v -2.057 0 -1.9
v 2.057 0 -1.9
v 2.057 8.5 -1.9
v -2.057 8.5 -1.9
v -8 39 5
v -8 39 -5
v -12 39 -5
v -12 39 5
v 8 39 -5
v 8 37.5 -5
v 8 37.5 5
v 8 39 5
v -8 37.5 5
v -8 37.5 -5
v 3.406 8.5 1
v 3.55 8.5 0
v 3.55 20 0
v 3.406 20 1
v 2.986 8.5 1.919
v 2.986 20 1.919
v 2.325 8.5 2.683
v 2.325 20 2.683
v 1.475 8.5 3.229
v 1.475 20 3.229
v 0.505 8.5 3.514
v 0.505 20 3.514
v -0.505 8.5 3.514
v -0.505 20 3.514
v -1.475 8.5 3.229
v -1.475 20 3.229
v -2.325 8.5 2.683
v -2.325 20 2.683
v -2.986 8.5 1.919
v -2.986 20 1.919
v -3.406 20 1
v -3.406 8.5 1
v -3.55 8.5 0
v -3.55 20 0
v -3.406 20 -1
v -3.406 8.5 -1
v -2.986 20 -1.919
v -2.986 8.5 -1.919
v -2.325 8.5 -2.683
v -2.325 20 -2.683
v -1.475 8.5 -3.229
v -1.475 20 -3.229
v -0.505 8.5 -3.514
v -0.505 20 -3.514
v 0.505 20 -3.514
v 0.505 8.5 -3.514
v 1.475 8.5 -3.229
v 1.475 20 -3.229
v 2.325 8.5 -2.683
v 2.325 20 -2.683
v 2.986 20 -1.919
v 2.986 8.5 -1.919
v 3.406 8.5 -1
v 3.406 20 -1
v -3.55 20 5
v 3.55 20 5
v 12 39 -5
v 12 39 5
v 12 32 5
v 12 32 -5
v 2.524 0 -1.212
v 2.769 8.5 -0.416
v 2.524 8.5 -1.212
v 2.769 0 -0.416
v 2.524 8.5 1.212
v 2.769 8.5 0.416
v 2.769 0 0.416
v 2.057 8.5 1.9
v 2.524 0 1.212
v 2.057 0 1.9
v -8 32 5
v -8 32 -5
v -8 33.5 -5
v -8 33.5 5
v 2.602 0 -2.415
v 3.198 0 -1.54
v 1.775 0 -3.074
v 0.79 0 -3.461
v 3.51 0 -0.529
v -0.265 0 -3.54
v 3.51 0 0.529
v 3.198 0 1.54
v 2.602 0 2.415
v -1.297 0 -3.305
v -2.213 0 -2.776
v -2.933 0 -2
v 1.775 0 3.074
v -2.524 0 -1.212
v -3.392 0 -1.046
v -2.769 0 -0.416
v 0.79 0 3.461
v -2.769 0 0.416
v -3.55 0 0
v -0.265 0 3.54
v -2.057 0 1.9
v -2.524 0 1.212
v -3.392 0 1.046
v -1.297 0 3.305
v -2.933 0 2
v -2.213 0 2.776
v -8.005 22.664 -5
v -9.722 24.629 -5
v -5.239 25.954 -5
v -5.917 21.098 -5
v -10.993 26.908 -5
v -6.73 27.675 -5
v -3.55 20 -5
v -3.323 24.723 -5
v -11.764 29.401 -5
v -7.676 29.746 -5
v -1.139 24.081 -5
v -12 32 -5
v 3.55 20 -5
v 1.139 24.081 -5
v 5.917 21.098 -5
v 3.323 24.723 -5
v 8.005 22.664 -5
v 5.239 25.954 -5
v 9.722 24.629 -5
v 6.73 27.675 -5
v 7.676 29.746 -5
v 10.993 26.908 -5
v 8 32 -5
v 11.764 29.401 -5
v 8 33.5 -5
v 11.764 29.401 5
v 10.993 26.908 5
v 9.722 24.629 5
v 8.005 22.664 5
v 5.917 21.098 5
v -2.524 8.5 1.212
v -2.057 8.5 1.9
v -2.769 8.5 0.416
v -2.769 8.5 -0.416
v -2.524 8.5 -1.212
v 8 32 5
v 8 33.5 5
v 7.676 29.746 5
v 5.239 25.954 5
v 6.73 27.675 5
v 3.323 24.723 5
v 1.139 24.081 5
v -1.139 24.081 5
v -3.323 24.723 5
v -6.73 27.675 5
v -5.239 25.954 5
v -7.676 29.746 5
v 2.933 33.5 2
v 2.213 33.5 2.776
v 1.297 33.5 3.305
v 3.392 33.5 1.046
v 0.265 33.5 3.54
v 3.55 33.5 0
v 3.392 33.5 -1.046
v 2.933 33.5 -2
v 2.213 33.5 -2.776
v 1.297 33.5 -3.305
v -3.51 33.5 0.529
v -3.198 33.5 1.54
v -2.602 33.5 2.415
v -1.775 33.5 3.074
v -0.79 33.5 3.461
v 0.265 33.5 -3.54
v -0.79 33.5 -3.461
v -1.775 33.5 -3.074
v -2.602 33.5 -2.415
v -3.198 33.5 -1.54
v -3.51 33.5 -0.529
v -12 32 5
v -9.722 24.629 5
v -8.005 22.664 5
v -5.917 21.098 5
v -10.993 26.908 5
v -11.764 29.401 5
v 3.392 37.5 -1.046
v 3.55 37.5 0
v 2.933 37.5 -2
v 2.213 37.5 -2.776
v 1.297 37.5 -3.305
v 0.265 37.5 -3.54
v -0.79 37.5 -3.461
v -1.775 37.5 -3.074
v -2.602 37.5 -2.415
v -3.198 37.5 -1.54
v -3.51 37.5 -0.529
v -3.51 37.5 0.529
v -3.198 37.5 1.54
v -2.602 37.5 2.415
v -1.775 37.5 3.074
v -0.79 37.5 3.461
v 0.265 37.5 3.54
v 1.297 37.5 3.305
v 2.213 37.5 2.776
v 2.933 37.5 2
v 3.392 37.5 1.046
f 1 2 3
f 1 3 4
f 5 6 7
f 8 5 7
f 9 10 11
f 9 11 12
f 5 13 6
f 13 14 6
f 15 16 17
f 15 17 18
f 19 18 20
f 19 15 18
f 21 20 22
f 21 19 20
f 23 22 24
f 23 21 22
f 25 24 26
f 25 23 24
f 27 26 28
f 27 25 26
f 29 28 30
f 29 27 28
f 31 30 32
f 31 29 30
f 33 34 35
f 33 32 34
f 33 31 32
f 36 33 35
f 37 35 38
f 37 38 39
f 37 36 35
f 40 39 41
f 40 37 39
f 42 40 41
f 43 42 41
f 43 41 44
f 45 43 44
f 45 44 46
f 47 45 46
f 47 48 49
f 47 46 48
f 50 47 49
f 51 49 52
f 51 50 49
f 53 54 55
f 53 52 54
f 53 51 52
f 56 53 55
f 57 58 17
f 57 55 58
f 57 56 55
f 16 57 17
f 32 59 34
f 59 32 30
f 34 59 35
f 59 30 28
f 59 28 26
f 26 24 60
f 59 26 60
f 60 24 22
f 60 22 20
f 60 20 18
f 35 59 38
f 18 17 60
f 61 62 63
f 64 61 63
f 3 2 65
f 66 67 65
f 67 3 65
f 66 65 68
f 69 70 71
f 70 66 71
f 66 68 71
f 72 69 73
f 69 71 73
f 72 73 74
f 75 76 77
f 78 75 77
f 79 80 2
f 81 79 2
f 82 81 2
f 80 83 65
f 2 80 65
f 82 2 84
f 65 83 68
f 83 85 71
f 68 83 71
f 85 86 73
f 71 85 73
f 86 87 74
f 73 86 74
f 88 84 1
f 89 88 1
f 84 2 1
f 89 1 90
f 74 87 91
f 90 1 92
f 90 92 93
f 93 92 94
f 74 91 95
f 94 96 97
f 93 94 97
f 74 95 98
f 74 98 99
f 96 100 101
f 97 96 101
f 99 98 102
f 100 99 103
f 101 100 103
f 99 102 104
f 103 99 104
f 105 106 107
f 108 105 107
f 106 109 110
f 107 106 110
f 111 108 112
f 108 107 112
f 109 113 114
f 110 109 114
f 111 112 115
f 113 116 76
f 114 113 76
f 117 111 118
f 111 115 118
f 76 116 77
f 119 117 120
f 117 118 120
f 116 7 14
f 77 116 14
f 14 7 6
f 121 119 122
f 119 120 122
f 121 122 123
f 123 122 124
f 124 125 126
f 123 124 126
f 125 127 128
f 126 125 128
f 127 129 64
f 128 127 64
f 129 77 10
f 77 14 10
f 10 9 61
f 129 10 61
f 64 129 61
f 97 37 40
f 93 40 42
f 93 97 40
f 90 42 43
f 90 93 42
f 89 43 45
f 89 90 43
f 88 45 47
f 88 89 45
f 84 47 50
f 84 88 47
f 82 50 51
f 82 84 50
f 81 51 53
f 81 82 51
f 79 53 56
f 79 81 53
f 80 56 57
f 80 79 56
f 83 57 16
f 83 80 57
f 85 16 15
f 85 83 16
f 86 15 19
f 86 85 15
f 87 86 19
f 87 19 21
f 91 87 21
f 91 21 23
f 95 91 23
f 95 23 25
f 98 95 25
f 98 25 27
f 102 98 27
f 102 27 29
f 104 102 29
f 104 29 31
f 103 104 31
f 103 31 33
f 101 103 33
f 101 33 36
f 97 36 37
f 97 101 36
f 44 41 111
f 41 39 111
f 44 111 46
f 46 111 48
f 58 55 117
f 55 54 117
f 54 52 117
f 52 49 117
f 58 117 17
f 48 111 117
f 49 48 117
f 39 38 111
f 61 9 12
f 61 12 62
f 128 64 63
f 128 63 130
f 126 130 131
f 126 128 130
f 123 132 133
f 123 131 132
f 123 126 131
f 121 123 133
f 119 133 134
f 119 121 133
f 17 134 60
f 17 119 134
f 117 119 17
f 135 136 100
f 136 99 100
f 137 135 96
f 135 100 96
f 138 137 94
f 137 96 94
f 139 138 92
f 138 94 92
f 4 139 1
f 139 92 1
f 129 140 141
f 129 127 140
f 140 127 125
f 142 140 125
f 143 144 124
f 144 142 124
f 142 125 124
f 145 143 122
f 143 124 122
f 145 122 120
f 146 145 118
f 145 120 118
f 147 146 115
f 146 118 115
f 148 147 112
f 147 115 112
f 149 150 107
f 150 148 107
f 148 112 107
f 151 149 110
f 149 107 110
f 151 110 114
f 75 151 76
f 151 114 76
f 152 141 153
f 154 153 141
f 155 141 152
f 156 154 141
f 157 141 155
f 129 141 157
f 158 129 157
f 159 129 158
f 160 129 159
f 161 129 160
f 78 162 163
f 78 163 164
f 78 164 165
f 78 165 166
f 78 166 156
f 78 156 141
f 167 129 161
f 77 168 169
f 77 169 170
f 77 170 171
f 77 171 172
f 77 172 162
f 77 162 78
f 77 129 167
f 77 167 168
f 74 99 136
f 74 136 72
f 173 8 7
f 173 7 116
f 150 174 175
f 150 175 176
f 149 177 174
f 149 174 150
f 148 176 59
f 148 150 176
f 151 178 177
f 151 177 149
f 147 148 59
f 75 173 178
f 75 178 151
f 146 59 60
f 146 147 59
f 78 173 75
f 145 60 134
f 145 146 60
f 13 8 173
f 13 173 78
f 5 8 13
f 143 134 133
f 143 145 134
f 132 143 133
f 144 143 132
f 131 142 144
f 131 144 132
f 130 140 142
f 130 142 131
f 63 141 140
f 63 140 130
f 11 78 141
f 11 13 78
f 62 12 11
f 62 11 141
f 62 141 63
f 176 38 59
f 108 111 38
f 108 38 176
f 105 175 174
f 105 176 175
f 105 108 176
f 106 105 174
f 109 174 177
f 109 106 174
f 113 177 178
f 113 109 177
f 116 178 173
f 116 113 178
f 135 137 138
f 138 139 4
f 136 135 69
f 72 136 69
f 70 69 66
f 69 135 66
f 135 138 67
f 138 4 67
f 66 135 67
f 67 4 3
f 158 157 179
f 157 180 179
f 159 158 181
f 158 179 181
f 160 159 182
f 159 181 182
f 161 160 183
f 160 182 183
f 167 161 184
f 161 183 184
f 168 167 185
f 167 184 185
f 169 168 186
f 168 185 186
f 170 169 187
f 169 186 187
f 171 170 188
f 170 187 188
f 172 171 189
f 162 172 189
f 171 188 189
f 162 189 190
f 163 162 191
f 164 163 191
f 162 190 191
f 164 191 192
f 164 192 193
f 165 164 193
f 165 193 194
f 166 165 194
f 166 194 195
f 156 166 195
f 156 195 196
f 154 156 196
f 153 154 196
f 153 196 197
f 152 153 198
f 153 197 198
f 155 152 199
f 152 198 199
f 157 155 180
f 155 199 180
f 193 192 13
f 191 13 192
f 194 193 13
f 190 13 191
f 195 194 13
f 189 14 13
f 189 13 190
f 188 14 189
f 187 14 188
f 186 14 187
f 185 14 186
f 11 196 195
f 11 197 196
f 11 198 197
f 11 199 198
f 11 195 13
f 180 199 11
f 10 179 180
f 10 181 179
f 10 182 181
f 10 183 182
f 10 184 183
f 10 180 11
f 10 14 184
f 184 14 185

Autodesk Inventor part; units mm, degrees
ref_plane "YZ Plane" through (0, 0, 0) normal (1, 0, 0) x (0, 1, 0)
ref_plane "XZ Plane" through (0, 0, 0) normal (0, 1, 0) x (-1, 0, 0)
ref_plane "XY Plane" through (0, 0, 0) normal (0, 0, 1) x (1, 0, 0)
sketch "Sketch1" plane through (0, 0, 0) normal (0, 1, 0) x (-1, 0, 0)
  circle A0 centre (0, 0) radius 3.55
  circle A1 centre (0, 0) radius 2.8
  line L0 (0, -2.8) -> (0, -1.9)
  line L1 (0, 2.8) -> (0, 1.9)
  line L2 (2.0567, 1.9) -> (-2.0567, 1.9)
  line L3 (-2.0567, -1.9) -> (2.0567, -1.9)
  dimension "d0" = 7.1
  dimension "d1" = 5.6
  dimension "d2" = 0.9
  dimension "d3" = 0.9
  dimension "d4" = 4.1134
  dimension "d5" = 4.1134
extrude "Extrusion1" add sketch "Sketch1" along normal blind 8.5 contours A0 | L2 L1 A1 | A1 L0 L3 | L1 L2 A1 | A1 L3 L0
sketch "Sketch2" plane through (0, 8.5, 0) normal (0, 1, 0) x (1, 0, 0)
  arc A0 (-2.0567, 1.9) -> (-2.0567, -1.9) centre (0, 0) ccw projected
  circle A1 centre (0, 0) radius 3.55
  dimension "d8" = 7.1
extrude "Extrusion2" add sketch "Sketch2" along normal blind 11.5
sketch "Sketch3" plane through (0, 0, 0) normal (0, 0, 1) x (1, 0, 0)
  line L0 (3.55, 20) -> (-3.55, 20) construction
  line L1 (0, 20) -> (0, 32) construction
  line L2 (0, 32) -> (-12, 32) construction
  line L3 (0, 32) -> (12, 32) construction
  arc A0 (-12, 32) -> (-3.55, 20) centre (0.4988, 31.8261) ccw
  arc A1 (3.55, 20) -> (12, 32) centre (-0.4988, 31.8261) ccw
  line L4 (-12, 32) -> (-8, 32)
  line L5 (12, 32) -> (8, 32)
  circle A2 centre (0, 32) radius 8
  line L6 (-12, 32) -> (-8, 32)
  line L7 (-8, 32) -> (-8, 39)
  line L8 (-8, 39) -> (-12, 39)
  line L9 (-12, 39) -> (-12, 32)
  line L10 (12, 32) -> (8, 32)
  line L11 (8, 32) -> (8, 39)
  line L12 (8, 39) -> (12, 39)
  line L13 (12, 39) -> (12, 32)
  line L14 (-8, 32) -> (-8, 34.0142) construction
  line L15 (-8, 39) -> (-8, 37.5) construction
  line L16 (8, 32) -> (8, 35.1588) construction
  line L17 (-8, 37.5) -> (8, 37.5)
  line L18 (8, 37.5) -> (8, 33.5)
  line L19 (8, 33.5) -> (-8, 33.5)
  line L20 (-8, 33.5) -> (-8, 37.5)
  line L21 (-3.55, 20) -> (3.55, 20)
  point P0 (0, 0)
  point P1 (8, 37.5)
  dimension "d11" = 12
  dimension "d12" = 12
  dimension "d13" = 12
  dimension "d14" = 12.5
  dimension "d15" = 12.5
  dimension "d16" = 4
  dimension "d17" = 4
  dimension "d18" = 7
  dimension "d19" = 7
  dimension "d20" = 4
  dimension "d21" = 4
  dimension "d22" = 1.5
  dimension "d23" = 1.5
  dimension "d24" = 1.5
extrude "Extrusion3" add sketch "Sketch3" along normal mid plane 10 contours L4 A2 L5 A1 L21 A0 | L9 L8 L7 L4 | L11 L12 L13 L5 | L19 L7 L17 A2 | A2 L17 L19 | A2 L17 L11 L19
sketch "Sketch4" plane through (-8, 37.5, 5) normal (0, 1, 0) x (1, 0, 0)
  circle A0 centre (8, 5) radius 3.55 projected
  circle A1 centre (8, 5) radius 3.55
  point P0 (8, 3.5)
extrude "Extrusion4" cut sketch "Sketch4" against normal blind 10
properties part number "Universal joint"
